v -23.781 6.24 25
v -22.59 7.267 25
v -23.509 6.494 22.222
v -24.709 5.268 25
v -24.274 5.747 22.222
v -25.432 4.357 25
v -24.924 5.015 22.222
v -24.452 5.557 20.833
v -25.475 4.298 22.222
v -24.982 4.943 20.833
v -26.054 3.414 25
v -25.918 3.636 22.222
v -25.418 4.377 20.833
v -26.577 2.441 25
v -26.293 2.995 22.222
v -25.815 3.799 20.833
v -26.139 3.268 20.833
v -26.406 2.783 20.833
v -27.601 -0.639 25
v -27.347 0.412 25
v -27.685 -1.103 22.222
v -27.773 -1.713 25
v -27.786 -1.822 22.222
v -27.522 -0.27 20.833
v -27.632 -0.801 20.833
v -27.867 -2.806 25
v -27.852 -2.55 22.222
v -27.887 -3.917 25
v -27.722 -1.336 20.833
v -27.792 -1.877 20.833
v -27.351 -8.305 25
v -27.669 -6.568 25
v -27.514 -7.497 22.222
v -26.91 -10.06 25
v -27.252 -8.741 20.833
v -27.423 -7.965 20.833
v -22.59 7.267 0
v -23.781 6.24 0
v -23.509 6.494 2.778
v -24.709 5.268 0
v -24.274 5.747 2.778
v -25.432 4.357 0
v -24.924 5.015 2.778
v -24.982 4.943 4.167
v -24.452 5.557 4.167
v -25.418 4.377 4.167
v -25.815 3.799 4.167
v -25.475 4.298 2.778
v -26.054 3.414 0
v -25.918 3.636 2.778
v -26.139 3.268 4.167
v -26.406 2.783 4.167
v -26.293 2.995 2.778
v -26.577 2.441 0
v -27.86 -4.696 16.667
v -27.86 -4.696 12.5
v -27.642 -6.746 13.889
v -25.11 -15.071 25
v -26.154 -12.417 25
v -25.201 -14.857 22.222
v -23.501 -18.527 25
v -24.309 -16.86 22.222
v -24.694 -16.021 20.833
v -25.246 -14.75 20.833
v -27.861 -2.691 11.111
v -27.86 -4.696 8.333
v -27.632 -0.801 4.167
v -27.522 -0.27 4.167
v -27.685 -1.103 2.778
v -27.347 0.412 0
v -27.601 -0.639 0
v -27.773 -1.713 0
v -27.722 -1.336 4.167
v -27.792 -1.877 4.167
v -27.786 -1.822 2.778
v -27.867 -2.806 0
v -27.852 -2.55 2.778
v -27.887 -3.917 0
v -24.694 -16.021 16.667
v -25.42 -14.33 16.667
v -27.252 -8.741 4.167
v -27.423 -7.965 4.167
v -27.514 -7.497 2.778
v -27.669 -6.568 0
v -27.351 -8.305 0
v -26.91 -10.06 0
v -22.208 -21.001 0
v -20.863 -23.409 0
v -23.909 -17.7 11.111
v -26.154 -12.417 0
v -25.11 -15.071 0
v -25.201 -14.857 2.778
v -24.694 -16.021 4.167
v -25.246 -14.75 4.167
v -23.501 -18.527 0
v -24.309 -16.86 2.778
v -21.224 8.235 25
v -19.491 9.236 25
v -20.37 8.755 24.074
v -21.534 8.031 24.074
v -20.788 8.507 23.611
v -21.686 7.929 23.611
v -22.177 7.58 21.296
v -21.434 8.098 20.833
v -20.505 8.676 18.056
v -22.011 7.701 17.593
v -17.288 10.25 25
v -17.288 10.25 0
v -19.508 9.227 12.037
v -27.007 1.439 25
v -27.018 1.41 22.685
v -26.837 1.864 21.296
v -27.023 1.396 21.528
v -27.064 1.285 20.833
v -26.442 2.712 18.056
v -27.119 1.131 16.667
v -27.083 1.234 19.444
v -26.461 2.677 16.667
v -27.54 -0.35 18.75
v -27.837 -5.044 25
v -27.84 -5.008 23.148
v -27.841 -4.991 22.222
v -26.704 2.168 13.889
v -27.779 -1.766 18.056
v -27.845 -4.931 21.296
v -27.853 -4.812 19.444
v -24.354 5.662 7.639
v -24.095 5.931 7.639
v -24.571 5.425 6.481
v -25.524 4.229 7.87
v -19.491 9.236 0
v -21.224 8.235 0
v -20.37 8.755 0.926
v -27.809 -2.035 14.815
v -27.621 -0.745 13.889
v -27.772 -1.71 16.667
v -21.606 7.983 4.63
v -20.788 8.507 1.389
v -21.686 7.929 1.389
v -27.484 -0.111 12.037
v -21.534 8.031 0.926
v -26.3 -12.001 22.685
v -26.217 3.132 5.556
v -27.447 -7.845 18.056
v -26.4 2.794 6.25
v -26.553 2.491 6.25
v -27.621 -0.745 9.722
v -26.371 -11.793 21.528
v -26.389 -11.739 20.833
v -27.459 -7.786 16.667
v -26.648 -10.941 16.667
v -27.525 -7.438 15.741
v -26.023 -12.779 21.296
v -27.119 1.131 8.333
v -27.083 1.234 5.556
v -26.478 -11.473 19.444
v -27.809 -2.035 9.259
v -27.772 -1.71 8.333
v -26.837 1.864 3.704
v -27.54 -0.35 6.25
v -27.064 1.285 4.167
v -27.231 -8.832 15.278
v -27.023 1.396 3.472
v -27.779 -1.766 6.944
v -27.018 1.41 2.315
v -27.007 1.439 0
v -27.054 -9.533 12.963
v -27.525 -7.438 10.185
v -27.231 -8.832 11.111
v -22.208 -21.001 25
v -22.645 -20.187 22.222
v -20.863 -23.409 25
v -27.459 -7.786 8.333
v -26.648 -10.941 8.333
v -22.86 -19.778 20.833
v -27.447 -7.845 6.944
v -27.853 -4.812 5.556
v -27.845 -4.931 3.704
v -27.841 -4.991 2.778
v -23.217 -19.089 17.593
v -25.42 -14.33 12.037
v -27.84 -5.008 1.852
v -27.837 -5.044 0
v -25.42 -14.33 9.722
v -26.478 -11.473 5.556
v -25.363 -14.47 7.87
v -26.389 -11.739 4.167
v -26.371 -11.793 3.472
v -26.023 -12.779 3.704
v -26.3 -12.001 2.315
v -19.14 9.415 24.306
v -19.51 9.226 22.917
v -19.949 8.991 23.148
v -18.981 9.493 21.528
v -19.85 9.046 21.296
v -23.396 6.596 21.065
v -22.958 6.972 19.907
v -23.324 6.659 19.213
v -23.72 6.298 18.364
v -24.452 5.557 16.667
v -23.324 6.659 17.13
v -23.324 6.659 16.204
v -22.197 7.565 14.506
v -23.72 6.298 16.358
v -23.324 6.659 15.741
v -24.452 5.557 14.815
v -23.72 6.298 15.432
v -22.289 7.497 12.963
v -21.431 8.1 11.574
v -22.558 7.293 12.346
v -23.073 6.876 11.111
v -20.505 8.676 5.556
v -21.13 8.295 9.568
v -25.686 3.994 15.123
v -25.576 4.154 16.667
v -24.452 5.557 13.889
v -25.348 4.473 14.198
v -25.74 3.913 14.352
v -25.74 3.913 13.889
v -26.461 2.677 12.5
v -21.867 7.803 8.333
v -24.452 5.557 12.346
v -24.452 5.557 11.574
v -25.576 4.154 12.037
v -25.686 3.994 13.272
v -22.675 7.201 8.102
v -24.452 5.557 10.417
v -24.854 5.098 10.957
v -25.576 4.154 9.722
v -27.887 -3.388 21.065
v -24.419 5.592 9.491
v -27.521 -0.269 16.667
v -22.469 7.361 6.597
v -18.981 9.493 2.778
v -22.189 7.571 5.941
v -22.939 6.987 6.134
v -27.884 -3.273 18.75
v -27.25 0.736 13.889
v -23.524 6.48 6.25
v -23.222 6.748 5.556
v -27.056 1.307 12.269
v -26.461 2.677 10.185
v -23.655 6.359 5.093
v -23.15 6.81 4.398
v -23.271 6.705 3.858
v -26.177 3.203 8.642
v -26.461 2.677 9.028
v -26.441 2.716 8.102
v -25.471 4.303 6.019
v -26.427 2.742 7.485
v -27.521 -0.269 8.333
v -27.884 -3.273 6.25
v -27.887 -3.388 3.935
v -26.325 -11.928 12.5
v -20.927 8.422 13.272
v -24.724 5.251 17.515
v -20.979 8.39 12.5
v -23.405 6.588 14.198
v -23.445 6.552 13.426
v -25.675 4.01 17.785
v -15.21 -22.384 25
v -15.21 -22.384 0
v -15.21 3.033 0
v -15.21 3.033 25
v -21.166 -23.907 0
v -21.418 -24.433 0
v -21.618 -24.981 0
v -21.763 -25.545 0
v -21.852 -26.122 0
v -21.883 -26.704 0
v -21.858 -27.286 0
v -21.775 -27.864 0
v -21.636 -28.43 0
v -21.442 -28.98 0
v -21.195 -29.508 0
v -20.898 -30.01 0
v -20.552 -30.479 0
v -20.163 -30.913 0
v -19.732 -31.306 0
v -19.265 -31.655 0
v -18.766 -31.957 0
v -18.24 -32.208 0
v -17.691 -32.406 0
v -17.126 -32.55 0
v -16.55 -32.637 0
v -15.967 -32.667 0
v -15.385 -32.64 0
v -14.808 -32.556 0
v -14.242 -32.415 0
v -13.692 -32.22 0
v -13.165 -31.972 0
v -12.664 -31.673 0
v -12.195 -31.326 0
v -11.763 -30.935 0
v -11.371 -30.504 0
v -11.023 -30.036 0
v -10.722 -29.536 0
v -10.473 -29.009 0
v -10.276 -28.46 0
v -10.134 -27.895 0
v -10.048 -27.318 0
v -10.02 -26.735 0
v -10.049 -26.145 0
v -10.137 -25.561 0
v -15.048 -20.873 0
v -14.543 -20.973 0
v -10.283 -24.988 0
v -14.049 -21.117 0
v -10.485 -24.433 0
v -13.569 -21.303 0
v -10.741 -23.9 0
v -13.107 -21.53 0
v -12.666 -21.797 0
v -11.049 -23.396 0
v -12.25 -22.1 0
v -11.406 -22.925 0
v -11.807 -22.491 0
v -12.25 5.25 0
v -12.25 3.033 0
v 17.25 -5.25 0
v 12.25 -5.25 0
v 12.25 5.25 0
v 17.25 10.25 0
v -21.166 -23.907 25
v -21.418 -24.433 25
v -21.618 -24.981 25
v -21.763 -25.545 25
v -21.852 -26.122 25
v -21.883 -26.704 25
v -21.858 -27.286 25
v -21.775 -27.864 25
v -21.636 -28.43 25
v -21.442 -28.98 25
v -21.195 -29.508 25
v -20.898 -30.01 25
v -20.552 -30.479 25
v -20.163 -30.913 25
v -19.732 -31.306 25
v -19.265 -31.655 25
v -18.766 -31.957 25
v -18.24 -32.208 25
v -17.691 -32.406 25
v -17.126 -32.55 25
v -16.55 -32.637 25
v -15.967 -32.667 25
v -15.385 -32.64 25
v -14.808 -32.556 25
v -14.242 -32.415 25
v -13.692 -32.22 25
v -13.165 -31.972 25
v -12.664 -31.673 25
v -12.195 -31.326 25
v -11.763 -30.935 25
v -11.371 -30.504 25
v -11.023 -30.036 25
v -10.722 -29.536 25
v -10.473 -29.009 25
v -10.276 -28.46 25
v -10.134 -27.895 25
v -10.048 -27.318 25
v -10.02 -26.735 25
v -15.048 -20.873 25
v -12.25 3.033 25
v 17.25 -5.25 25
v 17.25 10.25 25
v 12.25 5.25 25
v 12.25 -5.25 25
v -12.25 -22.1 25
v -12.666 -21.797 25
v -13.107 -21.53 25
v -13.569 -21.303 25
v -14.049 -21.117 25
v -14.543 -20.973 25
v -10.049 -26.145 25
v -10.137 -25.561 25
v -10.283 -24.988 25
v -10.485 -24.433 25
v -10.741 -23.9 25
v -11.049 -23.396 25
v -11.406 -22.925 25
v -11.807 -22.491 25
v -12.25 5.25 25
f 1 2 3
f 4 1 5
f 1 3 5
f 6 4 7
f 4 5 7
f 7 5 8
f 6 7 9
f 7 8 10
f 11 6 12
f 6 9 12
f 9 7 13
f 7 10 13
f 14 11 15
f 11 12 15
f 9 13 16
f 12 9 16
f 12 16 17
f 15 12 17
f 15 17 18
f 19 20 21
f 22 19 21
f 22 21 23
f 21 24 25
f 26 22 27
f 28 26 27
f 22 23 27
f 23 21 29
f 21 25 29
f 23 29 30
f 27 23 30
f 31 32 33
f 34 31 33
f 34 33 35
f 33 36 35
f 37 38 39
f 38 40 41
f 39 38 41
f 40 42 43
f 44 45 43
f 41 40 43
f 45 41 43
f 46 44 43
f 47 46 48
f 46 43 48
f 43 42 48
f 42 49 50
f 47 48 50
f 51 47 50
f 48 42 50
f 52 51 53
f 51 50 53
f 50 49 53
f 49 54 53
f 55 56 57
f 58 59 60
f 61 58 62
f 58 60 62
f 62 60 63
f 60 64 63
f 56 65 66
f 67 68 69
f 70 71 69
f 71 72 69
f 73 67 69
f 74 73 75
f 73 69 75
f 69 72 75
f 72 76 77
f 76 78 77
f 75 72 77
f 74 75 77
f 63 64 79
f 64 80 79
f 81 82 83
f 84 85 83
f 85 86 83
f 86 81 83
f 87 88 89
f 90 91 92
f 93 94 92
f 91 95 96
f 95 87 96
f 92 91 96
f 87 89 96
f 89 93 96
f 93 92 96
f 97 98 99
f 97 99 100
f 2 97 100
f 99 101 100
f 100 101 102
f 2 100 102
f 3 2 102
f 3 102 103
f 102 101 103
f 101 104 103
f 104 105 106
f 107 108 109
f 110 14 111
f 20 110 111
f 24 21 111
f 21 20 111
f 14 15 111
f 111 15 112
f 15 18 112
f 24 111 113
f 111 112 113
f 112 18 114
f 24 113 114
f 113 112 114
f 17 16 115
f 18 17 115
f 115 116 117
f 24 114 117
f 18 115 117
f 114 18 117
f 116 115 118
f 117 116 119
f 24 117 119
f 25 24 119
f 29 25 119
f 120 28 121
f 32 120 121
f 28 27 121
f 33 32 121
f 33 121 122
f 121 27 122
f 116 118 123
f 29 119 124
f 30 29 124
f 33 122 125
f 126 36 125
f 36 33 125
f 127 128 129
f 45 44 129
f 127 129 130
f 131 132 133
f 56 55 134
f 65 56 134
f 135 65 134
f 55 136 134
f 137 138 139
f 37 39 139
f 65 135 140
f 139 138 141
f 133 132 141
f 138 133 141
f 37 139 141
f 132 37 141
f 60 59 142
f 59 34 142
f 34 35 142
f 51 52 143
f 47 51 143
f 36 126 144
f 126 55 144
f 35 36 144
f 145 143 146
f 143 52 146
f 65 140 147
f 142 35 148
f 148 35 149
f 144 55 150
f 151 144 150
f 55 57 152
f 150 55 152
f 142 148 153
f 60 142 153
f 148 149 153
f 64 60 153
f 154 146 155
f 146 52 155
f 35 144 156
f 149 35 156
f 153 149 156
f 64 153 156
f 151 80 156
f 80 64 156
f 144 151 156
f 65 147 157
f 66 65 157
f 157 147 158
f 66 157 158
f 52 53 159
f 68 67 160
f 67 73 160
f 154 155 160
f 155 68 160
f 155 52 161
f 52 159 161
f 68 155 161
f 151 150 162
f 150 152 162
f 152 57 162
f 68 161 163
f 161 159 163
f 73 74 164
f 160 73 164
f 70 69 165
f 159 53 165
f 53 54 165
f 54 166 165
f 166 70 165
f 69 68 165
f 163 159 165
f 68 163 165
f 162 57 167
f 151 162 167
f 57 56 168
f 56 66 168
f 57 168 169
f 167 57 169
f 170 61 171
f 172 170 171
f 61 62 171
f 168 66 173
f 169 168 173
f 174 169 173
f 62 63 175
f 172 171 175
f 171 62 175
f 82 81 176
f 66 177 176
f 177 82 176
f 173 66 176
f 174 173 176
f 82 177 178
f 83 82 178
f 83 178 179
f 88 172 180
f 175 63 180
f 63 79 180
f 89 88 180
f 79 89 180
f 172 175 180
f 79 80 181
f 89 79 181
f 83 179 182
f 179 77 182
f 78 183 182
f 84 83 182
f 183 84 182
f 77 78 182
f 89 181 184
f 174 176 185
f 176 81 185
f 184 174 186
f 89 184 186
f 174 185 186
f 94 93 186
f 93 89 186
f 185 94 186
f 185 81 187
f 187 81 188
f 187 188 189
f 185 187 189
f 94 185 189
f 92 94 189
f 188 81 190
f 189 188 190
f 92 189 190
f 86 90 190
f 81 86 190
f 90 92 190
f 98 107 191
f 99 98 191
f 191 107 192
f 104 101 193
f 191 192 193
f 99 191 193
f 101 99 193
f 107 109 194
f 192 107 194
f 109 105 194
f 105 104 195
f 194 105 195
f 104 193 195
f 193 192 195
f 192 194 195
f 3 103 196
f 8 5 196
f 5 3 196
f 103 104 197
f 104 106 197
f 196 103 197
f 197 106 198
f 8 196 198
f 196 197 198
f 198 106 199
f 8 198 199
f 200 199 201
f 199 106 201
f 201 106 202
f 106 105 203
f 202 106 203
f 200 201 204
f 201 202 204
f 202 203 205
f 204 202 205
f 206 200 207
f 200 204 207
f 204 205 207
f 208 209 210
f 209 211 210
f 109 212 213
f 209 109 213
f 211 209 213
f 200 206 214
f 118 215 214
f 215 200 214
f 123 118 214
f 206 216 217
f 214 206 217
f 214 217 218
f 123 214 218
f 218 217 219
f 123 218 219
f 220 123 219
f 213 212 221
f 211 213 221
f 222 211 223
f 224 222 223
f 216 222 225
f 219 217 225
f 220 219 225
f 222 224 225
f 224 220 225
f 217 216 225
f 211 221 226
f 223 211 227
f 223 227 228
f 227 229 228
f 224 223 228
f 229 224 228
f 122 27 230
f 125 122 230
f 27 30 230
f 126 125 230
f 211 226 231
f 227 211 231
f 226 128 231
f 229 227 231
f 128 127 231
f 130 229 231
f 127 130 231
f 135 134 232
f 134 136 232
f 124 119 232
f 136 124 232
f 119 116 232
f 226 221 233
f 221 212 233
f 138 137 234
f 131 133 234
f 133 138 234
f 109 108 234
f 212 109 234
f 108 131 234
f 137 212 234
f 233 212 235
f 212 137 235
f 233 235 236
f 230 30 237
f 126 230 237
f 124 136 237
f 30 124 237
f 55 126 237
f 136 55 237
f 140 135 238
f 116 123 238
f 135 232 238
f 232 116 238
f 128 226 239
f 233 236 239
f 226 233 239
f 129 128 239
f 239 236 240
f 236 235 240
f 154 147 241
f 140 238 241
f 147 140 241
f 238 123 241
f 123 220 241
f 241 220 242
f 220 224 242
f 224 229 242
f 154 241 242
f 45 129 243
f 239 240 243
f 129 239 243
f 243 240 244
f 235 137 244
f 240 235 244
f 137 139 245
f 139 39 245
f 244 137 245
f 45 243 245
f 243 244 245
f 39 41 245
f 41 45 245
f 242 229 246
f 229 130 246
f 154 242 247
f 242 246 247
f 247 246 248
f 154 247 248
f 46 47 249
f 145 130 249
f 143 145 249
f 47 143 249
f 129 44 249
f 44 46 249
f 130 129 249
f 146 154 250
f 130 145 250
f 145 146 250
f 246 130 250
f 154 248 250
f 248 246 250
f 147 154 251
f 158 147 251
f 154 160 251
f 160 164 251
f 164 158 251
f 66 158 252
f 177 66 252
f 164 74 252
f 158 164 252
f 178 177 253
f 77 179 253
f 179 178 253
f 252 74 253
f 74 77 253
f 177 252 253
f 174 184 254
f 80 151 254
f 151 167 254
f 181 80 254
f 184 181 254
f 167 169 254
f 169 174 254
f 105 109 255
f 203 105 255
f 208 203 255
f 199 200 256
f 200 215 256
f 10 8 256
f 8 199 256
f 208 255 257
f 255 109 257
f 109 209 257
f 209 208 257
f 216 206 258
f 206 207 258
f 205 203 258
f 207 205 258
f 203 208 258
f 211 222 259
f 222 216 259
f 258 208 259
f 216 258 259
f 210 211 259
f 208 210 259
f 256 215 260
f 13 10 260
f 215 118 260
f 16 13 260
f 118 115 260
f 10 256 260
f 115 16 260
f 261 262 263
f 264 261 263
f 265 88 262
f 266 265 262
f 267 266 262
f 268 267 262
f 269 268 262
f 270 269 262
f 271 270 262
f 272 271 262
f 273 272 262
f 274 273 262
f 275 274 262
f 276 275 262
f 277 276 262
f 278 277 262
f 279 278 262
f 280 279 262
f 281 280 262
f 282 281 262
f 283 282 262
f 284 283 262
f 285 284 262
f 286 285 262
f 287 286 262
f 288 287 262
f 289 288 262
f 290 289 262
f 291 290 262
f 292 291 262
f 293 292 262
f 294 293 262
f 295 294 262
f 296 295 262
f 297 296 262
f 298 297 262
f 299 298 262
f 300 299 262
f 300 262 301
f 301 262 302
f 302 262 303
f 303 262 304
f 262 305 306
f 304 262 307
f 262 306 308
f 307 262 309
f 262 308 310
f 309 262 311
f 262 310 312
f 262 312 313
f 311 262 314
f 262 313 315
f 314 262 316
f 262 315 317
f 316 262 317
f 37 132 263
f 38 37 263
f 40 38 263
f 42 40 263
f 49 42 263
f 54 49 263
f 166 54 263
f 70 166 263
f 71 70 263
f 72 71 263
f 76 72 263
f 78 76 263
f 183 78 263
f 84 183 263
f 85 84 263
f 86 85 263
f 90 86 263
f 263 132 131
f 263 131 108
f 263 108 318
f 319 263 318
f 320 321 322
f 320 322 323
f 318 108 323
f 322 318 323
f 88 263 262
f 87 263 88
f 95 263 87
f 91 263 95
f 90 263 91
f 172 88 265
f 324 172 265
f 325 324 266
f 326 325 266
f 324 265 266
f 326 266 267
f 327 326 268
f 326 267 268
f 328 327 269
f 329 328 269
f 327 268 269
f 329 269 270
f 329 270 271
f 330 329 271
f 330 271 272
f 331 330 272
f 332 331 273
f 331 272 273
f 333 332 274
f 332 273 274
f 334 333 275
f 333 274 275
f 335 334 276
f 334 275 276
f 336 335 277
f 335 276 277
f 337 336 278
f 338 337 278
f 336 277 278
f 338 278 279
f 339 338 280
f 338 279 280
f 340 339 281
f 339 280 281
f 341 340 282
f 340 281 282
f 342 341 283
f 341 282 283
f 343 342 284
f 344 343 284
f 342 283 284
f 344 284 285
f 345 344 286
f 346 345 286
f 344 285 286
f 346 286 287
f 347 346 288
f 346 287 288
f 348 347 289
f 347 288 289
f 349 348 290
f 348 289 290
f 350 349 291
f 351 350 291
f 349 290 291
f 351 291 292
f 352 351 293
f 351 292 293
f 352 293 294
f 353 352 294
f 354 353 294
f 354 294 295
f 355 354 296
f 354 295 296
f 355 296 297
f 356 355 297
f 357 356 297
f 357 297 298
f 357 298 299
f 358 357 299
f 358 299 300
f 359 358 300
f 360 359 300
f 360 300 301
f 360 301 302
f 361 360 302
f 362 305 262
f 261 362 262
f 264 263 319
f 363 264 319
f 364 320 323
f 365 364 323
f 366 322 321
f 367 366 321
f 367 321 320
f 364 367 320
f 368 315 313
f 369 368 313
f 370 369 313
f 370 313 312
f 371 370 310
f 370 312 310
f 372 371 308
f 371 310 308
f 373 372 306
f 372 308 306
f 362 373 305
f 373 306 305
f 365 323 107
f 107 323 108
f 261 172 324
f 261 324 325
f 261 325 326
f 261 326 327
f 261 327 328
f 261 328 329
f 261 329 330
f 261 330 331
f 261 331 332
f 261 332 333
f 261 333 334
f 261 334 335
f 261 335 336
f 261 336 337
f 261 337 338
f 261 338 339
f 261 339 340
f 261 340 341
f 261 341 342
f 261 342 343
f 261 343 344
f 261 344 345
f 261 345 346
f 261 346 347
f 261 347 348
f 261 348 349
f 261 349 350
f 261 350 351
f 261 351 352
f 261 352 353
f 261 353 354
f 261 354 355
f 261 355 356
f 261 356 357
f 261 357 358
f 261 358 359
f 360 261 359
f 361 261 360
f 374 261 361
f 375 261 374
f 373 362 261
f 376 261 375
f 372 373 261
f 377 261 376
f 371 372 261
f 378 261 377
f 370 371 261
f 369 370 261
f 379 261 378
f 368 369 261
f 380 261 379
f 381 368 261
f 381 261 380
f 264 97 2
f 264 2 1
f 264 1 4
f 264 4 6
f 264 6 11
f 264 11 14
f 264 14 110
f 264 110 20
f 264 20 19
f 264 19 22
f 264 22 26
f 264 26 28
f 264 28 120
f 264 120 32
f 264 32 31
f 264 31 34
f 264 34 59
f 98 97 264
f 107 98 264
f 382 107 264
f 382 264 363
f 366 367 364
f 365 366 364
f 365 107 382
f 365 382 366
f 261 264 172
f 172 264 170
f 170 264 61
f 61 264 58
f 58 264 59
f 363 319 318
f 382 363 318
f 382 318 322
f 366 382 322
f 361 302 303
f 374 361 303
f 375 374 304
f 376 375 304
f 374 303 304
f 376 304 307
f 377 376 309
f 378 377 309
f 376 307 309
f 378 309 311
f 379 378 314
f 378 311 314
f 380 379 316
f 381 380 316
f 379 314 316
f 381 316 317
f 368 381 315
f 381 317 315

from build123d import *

# Parameters (mm, degrees)
F1_DEPTH = 25


# Not quite as in the source:
# - a feature names something its author has since deleted; it is built from what else it names


with BuildPart() as f1:
    # F0 (on Top) → F1 (new body)
    with BuildSketch(Plane.XY):
        with BuildLine():
            Line((12.25, 5.25), (12.25, -5.25))
            Line((12.25, -5.25), (17.25, -5.25))
            Line((17.25, -5.25), (17.25, 10.25))
            Line((17.25, 10.25), (-17.288029389, 10.25))
            add(Edge.make_bspline(
                [(-17.288029389, 10.25), (-33.9326616892, 3.4588538136), (-27.6432598671, -11.5939724111), (-20.8629015828, -23.4088676175)],
                knots=[0, 0, 0, 0, 33.6081495202, 33.6081495202, 33.6081495202, 33.6081495202], degree=3))
            ThreePointArc((-20.8629015828, -23.4088676175), (-18.8330680728, -21.5504075494), (-16.1829780698, -20.8080323883))
            ThreePointArc((-16.1829780698, -20.8080323883), (-15.6956355504, -20.8090410674), (-15.2100205721, -20.8500513288))
            Line((-15.2100205721, -20.8500513288), (-15.2100205721, 3.0333888489))
            Line((-15.2100205721, 3.0333888489), (-12.4874287694, 3.0333888489))
            Line((-12.4874287694, 3.0333888489), (-12.25, 5.25))
            Line((-12.25, 5.25), (12.25, 5.25))
        make_face()
        Polygon((-12.4874287694, 3.0333888489), (-12.25, 3.0333888489), (-12.25, 5.25), align=None)
        with BuildLine():
            ThreePointArc((-10.0197441457, -26.7353467643), (-10.6063091532, -24.1634313379), (-12.25, -22.1001601804))
            ThreePointArc((-12.25, -22.1001601804), (-13.5686599523, -21.3031901955), (-15.0480940947, -20.872725511))
            Line((-15.0480940947, -20.872725511), (-15.2100205721, -22.3844548448))
            Line((-15.2100205721, -22.3844548448), (-15.2100205721, -20.8500513288))
            ThreePointArc((-15.2100205721, -20.8500513288), (-15.6956355504, -20.8090410674), (-16.1829780698, -20.8080323883))
            ThreePointArc((-16.1829780698, -20.8080323883), (-18.8330680728, -21.5504075494), (-20.8629015828, -23.4088676175))
            ThreePointArc((-20.8629015828, -23.4088676175), (-17.691321516, -32.4063150838), (-10.0197441457, -26.7353467643))
        make_face()
    extrude(amount=F1_DEPTH)


solid = f1.part
